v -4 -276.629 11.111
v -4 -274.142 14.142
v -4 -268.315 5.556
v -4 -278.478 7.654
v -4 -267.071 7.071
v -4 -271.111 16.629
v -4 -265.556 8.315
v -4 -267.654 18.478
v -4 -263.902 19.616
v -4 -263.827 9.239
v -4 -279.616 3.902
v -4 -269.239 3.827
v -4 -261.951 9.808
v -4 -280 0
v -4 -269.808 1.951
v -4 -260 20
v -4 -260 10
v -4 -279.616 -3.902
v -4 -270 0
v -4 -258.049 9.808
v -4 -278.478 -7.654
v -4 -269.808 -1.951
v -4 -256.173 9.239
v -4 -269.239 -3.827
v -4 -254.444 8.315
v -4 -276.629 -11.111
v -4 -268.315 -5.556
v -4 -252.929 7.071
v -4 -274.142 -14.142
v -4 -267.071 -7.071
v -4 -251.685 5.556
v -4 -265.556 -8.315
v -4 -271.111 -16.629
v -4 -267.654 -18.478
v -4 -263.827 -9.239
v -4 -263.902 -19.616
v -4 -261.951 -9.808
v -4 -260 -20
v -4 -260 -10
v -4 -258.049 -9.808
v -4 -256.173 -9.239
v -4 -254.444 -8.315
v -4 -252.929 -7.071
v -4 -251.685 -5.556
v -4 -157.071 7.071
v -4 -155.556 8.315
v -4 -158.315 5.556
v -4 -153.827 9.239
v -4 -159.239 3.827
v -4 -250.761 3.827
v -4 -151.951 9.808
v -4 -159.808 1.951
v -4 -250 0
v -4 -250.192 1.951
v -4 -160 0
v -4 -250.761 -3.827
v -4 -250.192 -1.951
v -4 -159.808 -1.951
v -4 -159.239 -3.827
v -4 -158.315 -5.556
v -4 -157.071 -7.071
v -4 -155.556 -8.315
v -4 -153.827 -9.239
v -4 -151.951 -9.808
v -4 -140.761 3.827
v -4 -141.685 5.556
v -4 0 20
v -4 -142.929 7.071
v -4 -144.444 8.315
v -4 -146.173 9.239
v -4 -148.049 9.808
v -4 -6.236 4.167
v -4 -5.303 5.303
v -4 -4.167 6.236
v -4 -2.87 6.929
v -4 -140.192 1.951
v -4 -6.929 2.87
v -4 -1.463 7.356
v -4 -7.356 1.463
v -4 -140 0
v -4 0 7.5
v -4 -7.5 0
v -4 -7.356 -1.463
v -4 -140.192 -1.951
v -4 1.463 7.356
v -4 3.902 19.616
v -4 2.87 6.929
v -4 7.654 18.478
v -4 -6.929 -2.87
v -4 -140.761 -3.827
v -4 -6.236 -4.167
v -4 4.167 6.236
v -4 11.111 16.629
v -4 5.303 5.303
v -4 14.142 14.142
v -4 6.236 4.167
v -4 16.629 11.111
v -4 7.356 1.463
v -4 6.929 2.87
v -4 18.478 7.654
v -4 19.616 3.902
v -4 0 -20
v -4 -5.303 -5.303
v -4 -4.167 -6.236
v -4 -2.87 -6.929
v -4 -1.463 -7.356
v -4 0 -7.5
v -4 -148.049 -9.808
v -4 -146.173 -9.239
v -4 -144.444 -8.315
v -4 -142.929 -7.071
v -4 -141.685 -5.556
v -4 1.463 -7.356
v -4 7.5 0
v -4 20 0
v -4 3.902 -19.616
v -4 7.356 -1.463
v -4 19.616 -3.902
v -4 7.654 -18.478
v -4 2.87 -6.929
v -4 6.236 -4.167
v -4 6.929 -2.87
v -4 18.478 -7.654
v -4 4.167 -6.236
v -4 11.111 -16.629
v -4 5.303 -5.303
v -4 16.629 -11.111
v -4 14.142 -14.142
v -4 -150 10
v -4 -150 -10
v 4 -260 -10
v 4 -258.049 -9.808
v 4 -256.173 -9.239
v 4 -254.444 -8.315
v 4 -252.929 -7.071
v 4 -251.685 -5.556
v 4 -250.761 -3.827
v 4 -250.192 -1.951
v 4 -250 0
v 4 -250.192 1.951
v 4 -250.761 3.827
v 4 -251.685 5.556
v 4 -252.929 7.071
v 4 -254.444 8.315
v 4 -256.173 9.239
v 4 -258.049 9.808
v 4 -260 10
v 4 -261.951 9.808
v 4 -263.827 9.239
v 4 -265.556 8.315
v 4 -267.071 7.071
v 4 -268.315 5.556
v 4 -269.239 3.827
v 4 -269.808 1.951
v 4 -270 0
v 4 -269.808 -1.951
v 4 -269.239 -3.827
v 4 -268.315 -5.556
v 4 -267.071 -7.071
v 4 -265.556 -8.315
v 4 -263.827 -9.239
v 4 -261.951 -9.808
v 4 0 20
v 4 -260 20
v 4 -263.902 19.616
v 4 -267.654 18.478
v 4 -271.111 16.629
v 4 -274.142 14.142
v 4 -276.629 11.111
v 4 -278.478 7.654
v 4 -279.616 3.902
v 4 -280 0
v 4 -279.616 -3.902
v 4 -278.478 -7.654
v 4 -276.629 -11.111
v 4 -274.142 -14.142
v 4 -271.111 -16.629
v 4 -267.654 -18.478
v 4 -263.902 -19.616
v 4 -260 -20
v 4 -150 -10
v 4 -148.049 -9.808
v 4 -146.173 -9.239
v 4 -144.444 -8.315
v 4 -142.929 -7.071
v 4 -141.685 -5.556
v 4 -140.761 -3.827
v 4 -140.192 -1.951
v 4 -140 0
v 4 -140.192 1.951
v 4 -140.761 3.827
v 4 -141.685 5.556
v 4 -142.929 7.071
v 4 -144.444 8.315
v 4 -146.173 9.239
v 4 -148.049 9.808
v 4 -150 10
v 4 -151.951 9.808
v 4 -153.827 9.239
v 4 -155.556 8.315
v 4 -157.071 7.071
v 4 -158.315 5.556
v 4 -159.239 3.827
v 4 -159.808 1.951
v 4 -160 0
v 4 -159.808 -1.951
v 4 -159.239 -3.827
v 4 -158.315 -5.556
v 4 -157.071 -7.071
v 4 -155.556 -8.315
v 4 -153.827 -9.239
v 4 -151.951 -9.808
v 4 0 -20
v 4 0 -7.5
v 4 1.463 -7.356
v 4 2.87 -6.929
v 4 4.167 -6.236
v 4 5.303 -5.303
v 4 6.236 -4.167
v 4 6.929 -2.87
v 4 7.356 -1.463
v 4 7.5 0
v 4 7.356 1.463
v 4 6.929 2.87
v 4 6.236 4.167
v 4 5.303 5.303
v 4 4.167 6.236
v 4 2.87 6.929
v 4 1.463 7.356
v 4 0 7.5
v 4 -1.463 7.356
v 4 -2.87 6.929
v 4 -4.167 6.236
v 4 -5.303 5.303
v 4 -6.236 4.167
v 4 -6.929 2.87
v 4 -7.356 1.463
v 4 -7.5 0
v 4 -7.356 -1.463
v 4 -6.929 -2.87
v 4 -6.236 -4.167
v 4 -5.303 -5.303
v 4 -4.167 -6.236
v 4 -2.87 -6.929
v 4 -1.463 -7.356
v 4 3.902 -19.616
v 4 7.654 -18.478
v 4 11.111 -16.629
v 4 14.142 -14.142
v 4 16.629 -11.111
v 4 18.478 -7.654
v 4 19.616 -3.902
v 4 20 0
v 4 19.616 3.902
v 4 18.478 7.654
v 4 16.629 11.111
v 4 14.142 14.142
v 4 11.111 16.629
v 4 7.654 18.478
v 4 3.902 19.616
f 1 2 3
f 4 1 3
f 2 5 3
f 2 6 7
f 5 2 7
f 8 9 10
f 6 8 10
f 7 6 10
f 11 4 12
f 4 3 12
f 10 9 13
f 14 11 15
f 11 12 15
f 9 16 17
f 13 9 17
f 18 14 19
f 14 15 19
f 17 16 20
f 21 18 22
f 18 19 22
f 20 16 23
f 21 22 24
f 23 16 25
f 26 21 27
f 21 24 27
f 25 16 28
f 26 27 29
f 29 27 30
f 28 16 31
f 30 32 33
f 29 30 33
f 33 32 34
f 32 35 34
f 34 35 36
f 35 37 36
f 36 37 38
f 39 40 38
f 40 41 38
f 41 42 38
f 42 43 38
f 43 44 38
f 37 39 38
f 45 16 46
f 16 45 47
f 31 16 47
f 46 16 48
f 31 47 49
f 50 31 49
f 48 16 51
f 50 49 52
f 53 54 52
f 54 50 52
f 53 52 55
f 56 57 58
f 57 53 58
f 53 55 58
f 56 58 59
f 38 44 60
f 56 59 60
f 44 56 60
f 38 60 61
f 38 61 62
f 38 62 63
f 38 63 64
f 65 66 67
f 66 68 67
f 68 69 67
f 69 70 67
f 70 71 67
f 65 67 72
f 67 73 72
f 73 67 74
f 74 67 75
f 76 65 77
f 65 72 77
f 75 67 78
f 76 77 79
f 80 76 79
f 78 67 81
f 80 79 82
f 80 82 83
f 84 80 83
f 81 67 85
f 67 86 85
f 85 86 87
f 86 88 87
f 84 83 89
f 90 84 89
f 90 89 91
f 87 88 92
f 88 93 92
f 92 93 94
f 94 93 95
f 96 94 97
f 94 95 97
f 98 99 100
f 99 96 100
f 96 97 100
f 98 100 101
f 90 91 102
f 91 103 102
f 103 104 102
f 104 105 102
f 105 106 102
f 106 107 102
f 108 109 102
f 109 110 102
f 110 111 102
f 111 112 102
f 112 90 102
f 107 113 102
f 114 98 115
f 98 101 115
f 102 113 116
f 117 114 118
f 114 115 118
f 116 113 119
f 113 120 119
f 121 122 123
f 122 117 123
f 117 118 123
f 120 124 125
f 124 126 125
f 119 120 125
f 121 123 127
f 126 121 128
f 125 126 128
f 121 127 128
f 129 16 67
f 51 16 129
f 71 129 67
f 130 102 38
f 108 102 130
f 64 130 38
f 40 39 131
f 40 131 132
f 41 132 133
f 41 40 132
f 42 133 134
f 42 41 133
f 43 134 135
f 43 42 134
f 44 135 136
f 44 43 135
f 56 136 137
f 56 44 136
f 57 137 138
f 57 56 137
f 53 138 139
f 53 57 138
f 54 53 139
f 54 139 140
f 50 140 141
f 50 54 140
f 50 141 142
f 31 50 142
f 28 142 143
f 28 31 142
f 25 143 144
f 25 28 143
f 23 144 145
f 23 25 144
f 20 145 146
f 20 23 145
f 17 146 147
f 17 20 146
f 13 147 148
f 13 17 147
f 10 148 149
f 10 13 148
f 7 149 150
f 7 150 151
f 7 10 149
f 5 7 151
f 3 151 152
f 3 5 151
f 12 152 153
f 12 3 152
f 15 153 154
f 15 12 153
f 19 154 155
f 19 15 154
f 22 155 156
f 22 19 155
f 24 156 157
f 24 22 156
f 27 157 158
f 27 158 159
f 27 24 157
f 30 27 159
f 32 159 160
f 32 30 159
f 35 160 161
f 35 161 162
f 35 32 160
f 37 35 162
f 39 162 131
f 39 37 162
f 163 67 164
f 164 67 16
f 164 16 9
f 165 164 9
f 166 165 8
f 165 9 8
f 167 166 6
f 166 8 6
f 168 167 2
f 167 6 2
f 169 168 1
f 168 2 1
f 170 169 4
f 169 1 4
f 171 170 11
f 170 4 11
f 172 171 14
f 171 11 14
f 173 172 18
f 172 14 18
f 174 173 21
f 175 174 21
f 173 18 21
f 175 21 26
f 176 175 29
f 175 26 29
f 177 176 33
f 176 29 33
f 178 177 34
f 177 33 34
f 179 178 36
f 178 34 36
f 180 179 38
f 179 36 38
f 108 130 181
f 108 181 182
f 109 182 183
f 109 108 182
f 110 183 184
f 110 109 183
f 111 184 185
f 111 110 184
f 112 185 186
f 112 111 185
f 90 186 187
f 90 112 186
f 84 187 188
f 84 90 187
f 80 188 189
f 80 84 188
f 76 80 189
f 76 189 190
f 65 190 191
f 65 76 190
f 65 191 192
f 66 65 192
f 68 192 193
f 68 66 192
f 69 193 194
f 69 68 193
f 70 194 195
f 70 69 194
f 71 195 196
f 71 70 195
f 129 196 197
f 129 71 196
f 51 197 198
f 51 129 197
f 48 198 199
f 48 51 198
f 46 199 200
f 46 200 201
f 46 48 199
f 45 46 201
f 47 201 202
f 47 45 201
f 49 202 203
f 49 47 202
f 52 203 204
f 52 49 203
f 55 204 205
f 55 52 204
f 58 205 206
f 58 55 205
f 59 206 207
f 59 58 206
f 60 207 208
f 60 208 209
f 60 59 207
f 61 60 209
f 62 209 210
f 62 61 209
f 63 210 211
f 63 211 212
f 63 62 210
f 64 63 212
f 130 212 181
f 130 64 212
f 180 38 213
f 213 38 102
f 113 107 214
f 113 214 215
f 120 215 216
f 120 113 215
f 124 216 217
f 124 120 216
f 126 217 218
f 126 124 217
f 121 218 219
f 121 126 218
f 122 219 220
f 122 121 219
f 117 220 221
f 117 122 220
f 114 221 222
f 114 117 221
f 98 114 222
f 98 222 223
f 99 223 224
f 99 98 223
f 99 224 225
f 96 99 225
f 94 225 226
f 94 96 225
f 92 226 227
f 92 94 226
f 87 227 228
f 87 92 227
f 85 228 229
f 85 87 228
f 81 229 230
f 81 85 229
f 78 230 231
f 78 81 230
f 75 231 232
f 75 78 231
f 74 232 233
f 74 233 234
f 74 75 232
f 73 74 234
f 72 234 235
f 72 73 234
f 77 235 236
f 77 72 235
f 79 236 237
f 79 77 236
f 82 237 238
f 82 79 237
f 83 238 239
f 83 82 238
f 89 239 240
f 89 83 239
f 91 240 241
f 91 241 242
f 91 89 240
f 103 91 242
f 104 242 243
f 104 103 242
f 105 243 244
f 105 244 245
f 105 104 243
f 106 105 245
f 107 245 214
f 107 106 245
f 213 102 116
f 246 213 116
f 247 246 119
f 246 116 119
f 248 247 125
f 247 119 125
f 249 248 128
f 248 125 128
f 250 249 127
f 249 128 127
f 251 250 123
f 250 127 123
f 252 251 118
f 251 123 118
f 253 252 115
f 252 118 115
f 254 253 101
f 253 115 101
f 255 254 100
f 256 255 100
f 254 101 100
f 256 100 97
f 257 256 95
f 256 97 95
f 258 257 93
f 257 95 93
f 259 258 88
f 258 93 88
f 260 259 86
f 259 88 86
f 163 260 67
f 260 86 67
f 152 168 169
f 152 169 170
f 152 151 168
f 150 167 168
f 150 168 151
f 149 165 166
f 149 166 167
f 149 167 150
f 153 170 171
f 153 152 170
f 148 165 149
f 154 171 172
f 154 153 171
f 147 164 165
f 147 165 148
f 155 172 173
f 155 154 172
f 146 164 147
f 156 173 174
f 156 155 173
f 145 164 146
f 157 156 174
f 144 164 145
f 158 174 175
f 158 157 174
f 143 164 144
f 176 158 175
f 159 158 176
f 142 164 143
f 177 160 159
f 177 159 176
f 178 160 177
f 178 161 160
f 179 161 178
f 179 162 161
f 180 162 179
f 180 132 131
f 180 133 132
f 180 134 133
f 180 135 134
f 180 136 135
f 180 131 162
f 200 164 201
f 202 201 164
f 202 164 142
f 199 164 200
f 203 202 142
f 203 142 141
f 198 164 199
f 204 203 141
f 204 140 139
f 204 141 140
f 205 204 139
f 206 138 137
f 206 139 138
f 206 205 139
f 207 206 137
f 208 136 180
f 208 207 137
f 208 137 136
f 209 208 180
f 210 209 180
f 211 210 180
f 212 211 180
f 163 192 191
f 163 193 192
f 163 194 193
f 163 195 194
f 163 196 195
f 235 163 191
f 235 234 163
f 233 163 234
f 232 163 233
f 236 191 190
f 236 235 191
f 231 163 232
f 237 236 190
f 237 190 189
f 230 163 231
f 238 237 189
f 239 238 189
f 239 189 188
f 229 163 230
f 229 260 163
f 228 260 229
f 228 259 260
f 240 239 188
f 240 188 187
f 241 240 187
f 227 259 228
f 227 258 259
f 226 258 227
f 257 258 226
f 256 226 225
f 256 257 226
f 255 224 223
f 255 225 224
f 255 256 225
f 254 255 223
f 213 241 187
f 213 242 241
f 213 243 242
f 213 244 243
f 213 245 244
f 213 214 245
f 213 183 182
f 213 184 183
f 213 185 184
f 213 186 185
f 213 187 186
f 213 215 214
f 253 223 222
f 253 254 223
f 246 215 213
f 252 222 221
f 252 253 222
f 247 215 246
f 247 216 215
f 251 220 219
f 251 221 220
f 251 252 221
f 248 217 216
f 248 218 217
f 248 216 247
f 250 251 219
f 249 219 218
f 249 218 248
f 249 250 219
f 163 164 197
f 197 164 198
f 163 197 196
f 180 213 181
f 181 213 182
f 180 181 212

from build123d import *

# Parameters (mm, degrees)
BOSS_EXTRUDE1_DEPTH      = 4
BOSS_EXTRUDE1_DEPTH_BACK = 4
SKETCH2_R                = 10
SKETCH2_R_2              = 7.5


with BuildPart() as part:
    # Sketch2 → Boss-Extrude1 (new, two sides: drawn at the far end of the back side and taken through both)
    with BuildSketch(Plane(origin=(0, 0, 0), x_dir=(0, 0, -1), z_dir=(1, 0, 0)).offset(-BOSS_EXTRUDE1_DEPTH_BACK)):
        with BuildLine():
            ThreePointArc((20, 0), (0, 20), (-20, 0))
            Line((-20, 0), (-20, -260))
            ThreePointArc((-20, -260), (0, -280), (20, -260))
            Line((20, -260), (20, 0))
        make_face()
        with Locations((0, -260)):
            Circle(SKETCH2_R, mode=Mode.SUBTRACT)
        with Locations((0, -150)):
            Circle(SKETCH2_R, mode=Mode.SUBTRACT)
        Circle(SKETCH2_R_2, mode=Mode.SUBTRACT)
    extrude(amount=BOSS_EXTRUDE1_DEPTH + BOSS_EXTRUDE1_DEPTH_BACK)


solid = part.part
